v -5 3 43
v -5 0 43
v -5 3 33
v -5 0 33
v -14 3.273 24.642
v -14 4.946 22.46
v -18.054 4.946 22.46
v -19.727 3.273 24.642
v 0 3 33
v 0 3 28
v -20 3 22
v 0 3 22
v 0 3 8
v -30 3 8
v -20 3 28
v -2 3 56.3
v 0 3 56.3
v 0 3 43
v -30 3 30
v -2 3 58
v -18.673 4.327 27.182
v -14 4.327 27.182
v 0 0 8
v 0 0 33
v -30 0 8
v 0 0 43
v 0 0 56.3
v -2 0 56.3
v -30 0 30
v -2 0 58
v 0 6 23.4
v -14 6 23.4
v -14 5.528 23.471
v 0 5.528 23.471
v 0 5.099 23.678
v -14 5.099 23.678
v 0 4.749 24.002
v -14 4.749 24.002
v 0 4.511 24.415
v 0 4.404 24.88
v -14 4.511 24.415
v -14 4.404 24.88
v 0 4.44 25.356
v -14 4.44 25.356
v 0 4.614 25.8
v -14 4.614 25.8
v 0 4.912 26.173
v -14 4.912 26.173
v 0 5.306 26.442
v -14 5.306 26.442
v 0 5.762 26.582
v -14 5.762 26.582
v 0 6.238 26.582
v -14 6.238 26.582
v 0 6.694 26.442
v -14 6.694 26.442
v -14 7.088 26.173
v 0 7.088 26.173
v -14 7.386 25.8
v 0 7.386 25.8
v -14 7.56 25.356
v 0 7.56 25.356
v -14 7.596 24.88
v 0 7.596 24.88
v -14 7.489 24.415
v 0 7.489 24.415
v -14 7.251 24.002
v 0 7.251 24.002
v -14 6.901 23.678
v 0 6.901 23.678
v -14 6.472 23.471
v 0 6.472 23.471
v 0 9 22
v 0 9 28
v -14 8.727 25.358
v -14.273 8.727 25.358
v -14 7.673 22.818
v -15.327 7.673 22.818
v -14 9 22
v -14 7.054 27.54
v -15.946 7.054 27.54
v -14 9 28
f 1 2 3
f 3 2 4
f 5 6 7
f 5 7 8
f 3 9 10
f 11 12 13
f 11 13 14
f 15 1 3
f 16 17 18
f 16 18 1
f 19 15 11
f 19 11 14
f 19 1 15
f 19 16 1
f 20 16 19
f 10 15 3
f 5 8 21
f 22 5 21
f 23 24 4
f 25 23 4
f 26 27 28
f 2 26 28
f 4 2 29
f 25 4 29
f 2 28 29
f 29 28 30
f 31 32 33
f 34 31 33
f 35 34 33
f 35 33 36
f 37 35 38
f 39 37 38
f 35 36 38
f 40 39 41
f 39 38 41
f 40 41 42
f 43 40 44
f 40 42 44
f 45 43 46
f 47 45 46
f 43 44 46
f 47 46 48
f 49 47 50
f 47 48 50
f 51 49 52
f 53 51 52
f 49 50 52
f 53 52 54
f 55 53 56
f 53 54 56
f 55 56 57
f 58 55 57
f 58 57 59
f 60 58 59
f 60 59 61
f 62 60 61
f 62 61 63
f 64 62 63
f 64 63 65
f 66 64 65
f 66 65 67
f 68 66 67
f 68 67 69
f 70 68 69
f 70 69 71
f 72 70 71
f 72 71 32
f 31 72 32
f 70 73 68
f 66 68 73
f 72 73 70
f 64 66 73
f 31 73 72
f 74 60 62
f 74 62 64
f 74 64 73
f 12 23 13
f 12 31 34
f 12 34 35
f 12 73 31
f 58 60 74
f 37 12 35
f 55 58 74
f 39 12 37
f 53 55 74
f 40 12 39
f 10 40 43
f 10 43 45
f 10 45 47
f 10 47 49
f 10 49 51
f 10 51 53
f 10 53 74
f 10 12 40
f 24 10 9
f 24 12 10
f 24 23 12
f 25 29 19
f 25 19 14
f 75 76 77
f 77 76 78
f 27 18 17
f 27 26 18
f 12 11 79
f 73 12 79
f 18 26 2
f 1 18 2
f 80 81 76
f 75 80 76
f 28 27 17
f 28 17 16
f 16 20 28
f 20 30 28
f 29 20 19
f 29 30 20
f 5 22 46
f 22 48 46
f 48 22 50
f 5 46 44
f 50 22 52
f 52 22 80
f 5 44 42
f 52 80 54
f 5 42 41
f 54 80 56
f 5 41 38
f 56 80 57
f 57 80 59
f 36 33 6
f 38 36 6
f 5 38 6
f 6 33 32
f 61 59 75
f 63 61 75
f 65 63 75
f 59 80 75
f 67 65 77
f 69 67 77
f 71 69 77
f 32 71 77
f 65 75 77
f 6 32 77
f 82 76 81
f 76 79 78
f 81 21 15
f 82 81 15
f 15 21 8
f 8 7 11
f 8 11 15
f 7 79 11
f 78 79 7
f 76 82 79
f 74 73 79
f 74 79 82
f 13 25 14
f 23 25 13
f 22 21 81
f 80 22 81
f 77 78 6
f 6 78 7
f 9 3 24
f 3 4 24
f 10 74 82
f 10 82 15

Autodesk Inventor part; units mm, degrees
ref_plane "YZ Plane" through (0, 0, 0) normal (1, 0, 0) x (0, 1, 0)
ref_plane "XZ Plane" through (0, 0, 0) normal (0, 1, 0) x (-1, 0, 0)
ref_plane "XY Plane" through (0, 0, 0) normal (0, 0, 1) x (1, 0, 0)
sketch "Szkic1" plane through (0, 0, 0) normal (0, 1, 0) x (-1, 0, 0)
  line L0 (0, 8) -> (0, 56.3)
  line L1 (0, 58) -> (2, 58) construction
  line L2 (2, 58) -> (2, 56.3) construction
  line L3 (2, 56.3) -> (0, 56.3) construction
  line L4 (0, 56.3) -> (0, 58) construction
  line L5 (30, 8) -> (30, 66.5) construction
  line L6 (2, 58) -> (30, 30)
  line L7 (2, 58) -> (41.598, 58) construction
  line L8 (30, 30) -> (30, 8)
  line L9 (2, 58) -> (2, 56.3)
  line L10 (0, 56.3) -> (2, 56.3)
  line L11 (2, 56.3) -> (2, 54.3) construction
  line L12 (0, 43) -> (5, 43)
  line L13 (5, 43) -> (5, 33)
  line L14 (5, 33) -> (0, 33)
  line L15 (0, 33) -> (0, 43)
  line L16 (30, 8) -> (0, 8)
  line L17 (30, 8) -> (30, 30)
  point P0 (0, 0)
  point P1 (0, 33)
  dimension "d0" = 58
  dimension "d1" = 2
  dimension "d2" = 1.7
  dimension "d4" = 45
  dimension "d7" = 2
  dimension "d8" = 5
  dimension "d9" = 10
  dimension "d13" = 30
  dimension "d14" = 22
  dimension "d15" = 58.5
  dimension "d16" = 30
  dimension "d17" = 25
  dimension "d18" = 8
extrude "Wyciągnięcie proste1" add sketch "Szkic1" along normal blind 3
extrude "Wyciągnięcie proste2" cut sketch "Szkic1" along normal blind 10 contours L0 L12 L13 L14
sketch "Sketch2" plane through (0, 0, 8) normal (1, 0, 0) x (0, 0, -1)
  line L0 (-25, 3) -> (0, 3) projected
  line L1 (-20, 3) -> (-14, 3)
  line L2 (-14, 3) -> (-14, 9)
  line L3 (-14, 9) -> (-20, 9)
  line L4 (-20, 9) -> (-20, 3)
  line L5 (-14.4598, 4.9465) -> (-16.6422, 3.2734)
  line L6 (-16.6422, 3.2734) -> (-19.1824, 4.3268)
  line L7 (-19.1824, 4.3268) -> (-19.5402, 7.0535)
  line L8 (-19.5402, 7.0535) -> (-17.3578, 8.7266)
  line L9 (-17.3578, 8.7266) -> (-14.8176, 7.6732)
  line L10 (-14.8176, 7.6732) -> (-14.4598, 4.9465)
  point P0 (8, 0)
  point P1 (-17, 6)
  point P2 (-17, 6)
  dimension "d19" = 6
  dimension "d20" = 6
  dimension "d21" = 5
  dimension "d24" = 3
  dimension "d25" = 3
  dimension "d29" = 1.6731
  dimension "d30" = 2.75
extrude "Extrusion3" add sketch "Sketch2" against normal blind 20 contours L4 L3 L2 L0 | L5 L6 L7 L8 L9 L10
extrude "Extrusion4" cut sketch "Sketch2" along normal blind 6 from surface at -20 contours L5 L6 L7 L8 L9 L10
chamfer "Chamfer2" distance 6 angle 45 1 edges at (-20, 9, 25)
hole "Hole1" at (0, 6, 25) direction (-1, 0, 0) diameter 3.2 depth 30 clearance for "Countersunk Flat Head Screw ISO 2009/7046" size "M3" standard "ISO"
properties part number "ScianaBocznaPEMv2"
